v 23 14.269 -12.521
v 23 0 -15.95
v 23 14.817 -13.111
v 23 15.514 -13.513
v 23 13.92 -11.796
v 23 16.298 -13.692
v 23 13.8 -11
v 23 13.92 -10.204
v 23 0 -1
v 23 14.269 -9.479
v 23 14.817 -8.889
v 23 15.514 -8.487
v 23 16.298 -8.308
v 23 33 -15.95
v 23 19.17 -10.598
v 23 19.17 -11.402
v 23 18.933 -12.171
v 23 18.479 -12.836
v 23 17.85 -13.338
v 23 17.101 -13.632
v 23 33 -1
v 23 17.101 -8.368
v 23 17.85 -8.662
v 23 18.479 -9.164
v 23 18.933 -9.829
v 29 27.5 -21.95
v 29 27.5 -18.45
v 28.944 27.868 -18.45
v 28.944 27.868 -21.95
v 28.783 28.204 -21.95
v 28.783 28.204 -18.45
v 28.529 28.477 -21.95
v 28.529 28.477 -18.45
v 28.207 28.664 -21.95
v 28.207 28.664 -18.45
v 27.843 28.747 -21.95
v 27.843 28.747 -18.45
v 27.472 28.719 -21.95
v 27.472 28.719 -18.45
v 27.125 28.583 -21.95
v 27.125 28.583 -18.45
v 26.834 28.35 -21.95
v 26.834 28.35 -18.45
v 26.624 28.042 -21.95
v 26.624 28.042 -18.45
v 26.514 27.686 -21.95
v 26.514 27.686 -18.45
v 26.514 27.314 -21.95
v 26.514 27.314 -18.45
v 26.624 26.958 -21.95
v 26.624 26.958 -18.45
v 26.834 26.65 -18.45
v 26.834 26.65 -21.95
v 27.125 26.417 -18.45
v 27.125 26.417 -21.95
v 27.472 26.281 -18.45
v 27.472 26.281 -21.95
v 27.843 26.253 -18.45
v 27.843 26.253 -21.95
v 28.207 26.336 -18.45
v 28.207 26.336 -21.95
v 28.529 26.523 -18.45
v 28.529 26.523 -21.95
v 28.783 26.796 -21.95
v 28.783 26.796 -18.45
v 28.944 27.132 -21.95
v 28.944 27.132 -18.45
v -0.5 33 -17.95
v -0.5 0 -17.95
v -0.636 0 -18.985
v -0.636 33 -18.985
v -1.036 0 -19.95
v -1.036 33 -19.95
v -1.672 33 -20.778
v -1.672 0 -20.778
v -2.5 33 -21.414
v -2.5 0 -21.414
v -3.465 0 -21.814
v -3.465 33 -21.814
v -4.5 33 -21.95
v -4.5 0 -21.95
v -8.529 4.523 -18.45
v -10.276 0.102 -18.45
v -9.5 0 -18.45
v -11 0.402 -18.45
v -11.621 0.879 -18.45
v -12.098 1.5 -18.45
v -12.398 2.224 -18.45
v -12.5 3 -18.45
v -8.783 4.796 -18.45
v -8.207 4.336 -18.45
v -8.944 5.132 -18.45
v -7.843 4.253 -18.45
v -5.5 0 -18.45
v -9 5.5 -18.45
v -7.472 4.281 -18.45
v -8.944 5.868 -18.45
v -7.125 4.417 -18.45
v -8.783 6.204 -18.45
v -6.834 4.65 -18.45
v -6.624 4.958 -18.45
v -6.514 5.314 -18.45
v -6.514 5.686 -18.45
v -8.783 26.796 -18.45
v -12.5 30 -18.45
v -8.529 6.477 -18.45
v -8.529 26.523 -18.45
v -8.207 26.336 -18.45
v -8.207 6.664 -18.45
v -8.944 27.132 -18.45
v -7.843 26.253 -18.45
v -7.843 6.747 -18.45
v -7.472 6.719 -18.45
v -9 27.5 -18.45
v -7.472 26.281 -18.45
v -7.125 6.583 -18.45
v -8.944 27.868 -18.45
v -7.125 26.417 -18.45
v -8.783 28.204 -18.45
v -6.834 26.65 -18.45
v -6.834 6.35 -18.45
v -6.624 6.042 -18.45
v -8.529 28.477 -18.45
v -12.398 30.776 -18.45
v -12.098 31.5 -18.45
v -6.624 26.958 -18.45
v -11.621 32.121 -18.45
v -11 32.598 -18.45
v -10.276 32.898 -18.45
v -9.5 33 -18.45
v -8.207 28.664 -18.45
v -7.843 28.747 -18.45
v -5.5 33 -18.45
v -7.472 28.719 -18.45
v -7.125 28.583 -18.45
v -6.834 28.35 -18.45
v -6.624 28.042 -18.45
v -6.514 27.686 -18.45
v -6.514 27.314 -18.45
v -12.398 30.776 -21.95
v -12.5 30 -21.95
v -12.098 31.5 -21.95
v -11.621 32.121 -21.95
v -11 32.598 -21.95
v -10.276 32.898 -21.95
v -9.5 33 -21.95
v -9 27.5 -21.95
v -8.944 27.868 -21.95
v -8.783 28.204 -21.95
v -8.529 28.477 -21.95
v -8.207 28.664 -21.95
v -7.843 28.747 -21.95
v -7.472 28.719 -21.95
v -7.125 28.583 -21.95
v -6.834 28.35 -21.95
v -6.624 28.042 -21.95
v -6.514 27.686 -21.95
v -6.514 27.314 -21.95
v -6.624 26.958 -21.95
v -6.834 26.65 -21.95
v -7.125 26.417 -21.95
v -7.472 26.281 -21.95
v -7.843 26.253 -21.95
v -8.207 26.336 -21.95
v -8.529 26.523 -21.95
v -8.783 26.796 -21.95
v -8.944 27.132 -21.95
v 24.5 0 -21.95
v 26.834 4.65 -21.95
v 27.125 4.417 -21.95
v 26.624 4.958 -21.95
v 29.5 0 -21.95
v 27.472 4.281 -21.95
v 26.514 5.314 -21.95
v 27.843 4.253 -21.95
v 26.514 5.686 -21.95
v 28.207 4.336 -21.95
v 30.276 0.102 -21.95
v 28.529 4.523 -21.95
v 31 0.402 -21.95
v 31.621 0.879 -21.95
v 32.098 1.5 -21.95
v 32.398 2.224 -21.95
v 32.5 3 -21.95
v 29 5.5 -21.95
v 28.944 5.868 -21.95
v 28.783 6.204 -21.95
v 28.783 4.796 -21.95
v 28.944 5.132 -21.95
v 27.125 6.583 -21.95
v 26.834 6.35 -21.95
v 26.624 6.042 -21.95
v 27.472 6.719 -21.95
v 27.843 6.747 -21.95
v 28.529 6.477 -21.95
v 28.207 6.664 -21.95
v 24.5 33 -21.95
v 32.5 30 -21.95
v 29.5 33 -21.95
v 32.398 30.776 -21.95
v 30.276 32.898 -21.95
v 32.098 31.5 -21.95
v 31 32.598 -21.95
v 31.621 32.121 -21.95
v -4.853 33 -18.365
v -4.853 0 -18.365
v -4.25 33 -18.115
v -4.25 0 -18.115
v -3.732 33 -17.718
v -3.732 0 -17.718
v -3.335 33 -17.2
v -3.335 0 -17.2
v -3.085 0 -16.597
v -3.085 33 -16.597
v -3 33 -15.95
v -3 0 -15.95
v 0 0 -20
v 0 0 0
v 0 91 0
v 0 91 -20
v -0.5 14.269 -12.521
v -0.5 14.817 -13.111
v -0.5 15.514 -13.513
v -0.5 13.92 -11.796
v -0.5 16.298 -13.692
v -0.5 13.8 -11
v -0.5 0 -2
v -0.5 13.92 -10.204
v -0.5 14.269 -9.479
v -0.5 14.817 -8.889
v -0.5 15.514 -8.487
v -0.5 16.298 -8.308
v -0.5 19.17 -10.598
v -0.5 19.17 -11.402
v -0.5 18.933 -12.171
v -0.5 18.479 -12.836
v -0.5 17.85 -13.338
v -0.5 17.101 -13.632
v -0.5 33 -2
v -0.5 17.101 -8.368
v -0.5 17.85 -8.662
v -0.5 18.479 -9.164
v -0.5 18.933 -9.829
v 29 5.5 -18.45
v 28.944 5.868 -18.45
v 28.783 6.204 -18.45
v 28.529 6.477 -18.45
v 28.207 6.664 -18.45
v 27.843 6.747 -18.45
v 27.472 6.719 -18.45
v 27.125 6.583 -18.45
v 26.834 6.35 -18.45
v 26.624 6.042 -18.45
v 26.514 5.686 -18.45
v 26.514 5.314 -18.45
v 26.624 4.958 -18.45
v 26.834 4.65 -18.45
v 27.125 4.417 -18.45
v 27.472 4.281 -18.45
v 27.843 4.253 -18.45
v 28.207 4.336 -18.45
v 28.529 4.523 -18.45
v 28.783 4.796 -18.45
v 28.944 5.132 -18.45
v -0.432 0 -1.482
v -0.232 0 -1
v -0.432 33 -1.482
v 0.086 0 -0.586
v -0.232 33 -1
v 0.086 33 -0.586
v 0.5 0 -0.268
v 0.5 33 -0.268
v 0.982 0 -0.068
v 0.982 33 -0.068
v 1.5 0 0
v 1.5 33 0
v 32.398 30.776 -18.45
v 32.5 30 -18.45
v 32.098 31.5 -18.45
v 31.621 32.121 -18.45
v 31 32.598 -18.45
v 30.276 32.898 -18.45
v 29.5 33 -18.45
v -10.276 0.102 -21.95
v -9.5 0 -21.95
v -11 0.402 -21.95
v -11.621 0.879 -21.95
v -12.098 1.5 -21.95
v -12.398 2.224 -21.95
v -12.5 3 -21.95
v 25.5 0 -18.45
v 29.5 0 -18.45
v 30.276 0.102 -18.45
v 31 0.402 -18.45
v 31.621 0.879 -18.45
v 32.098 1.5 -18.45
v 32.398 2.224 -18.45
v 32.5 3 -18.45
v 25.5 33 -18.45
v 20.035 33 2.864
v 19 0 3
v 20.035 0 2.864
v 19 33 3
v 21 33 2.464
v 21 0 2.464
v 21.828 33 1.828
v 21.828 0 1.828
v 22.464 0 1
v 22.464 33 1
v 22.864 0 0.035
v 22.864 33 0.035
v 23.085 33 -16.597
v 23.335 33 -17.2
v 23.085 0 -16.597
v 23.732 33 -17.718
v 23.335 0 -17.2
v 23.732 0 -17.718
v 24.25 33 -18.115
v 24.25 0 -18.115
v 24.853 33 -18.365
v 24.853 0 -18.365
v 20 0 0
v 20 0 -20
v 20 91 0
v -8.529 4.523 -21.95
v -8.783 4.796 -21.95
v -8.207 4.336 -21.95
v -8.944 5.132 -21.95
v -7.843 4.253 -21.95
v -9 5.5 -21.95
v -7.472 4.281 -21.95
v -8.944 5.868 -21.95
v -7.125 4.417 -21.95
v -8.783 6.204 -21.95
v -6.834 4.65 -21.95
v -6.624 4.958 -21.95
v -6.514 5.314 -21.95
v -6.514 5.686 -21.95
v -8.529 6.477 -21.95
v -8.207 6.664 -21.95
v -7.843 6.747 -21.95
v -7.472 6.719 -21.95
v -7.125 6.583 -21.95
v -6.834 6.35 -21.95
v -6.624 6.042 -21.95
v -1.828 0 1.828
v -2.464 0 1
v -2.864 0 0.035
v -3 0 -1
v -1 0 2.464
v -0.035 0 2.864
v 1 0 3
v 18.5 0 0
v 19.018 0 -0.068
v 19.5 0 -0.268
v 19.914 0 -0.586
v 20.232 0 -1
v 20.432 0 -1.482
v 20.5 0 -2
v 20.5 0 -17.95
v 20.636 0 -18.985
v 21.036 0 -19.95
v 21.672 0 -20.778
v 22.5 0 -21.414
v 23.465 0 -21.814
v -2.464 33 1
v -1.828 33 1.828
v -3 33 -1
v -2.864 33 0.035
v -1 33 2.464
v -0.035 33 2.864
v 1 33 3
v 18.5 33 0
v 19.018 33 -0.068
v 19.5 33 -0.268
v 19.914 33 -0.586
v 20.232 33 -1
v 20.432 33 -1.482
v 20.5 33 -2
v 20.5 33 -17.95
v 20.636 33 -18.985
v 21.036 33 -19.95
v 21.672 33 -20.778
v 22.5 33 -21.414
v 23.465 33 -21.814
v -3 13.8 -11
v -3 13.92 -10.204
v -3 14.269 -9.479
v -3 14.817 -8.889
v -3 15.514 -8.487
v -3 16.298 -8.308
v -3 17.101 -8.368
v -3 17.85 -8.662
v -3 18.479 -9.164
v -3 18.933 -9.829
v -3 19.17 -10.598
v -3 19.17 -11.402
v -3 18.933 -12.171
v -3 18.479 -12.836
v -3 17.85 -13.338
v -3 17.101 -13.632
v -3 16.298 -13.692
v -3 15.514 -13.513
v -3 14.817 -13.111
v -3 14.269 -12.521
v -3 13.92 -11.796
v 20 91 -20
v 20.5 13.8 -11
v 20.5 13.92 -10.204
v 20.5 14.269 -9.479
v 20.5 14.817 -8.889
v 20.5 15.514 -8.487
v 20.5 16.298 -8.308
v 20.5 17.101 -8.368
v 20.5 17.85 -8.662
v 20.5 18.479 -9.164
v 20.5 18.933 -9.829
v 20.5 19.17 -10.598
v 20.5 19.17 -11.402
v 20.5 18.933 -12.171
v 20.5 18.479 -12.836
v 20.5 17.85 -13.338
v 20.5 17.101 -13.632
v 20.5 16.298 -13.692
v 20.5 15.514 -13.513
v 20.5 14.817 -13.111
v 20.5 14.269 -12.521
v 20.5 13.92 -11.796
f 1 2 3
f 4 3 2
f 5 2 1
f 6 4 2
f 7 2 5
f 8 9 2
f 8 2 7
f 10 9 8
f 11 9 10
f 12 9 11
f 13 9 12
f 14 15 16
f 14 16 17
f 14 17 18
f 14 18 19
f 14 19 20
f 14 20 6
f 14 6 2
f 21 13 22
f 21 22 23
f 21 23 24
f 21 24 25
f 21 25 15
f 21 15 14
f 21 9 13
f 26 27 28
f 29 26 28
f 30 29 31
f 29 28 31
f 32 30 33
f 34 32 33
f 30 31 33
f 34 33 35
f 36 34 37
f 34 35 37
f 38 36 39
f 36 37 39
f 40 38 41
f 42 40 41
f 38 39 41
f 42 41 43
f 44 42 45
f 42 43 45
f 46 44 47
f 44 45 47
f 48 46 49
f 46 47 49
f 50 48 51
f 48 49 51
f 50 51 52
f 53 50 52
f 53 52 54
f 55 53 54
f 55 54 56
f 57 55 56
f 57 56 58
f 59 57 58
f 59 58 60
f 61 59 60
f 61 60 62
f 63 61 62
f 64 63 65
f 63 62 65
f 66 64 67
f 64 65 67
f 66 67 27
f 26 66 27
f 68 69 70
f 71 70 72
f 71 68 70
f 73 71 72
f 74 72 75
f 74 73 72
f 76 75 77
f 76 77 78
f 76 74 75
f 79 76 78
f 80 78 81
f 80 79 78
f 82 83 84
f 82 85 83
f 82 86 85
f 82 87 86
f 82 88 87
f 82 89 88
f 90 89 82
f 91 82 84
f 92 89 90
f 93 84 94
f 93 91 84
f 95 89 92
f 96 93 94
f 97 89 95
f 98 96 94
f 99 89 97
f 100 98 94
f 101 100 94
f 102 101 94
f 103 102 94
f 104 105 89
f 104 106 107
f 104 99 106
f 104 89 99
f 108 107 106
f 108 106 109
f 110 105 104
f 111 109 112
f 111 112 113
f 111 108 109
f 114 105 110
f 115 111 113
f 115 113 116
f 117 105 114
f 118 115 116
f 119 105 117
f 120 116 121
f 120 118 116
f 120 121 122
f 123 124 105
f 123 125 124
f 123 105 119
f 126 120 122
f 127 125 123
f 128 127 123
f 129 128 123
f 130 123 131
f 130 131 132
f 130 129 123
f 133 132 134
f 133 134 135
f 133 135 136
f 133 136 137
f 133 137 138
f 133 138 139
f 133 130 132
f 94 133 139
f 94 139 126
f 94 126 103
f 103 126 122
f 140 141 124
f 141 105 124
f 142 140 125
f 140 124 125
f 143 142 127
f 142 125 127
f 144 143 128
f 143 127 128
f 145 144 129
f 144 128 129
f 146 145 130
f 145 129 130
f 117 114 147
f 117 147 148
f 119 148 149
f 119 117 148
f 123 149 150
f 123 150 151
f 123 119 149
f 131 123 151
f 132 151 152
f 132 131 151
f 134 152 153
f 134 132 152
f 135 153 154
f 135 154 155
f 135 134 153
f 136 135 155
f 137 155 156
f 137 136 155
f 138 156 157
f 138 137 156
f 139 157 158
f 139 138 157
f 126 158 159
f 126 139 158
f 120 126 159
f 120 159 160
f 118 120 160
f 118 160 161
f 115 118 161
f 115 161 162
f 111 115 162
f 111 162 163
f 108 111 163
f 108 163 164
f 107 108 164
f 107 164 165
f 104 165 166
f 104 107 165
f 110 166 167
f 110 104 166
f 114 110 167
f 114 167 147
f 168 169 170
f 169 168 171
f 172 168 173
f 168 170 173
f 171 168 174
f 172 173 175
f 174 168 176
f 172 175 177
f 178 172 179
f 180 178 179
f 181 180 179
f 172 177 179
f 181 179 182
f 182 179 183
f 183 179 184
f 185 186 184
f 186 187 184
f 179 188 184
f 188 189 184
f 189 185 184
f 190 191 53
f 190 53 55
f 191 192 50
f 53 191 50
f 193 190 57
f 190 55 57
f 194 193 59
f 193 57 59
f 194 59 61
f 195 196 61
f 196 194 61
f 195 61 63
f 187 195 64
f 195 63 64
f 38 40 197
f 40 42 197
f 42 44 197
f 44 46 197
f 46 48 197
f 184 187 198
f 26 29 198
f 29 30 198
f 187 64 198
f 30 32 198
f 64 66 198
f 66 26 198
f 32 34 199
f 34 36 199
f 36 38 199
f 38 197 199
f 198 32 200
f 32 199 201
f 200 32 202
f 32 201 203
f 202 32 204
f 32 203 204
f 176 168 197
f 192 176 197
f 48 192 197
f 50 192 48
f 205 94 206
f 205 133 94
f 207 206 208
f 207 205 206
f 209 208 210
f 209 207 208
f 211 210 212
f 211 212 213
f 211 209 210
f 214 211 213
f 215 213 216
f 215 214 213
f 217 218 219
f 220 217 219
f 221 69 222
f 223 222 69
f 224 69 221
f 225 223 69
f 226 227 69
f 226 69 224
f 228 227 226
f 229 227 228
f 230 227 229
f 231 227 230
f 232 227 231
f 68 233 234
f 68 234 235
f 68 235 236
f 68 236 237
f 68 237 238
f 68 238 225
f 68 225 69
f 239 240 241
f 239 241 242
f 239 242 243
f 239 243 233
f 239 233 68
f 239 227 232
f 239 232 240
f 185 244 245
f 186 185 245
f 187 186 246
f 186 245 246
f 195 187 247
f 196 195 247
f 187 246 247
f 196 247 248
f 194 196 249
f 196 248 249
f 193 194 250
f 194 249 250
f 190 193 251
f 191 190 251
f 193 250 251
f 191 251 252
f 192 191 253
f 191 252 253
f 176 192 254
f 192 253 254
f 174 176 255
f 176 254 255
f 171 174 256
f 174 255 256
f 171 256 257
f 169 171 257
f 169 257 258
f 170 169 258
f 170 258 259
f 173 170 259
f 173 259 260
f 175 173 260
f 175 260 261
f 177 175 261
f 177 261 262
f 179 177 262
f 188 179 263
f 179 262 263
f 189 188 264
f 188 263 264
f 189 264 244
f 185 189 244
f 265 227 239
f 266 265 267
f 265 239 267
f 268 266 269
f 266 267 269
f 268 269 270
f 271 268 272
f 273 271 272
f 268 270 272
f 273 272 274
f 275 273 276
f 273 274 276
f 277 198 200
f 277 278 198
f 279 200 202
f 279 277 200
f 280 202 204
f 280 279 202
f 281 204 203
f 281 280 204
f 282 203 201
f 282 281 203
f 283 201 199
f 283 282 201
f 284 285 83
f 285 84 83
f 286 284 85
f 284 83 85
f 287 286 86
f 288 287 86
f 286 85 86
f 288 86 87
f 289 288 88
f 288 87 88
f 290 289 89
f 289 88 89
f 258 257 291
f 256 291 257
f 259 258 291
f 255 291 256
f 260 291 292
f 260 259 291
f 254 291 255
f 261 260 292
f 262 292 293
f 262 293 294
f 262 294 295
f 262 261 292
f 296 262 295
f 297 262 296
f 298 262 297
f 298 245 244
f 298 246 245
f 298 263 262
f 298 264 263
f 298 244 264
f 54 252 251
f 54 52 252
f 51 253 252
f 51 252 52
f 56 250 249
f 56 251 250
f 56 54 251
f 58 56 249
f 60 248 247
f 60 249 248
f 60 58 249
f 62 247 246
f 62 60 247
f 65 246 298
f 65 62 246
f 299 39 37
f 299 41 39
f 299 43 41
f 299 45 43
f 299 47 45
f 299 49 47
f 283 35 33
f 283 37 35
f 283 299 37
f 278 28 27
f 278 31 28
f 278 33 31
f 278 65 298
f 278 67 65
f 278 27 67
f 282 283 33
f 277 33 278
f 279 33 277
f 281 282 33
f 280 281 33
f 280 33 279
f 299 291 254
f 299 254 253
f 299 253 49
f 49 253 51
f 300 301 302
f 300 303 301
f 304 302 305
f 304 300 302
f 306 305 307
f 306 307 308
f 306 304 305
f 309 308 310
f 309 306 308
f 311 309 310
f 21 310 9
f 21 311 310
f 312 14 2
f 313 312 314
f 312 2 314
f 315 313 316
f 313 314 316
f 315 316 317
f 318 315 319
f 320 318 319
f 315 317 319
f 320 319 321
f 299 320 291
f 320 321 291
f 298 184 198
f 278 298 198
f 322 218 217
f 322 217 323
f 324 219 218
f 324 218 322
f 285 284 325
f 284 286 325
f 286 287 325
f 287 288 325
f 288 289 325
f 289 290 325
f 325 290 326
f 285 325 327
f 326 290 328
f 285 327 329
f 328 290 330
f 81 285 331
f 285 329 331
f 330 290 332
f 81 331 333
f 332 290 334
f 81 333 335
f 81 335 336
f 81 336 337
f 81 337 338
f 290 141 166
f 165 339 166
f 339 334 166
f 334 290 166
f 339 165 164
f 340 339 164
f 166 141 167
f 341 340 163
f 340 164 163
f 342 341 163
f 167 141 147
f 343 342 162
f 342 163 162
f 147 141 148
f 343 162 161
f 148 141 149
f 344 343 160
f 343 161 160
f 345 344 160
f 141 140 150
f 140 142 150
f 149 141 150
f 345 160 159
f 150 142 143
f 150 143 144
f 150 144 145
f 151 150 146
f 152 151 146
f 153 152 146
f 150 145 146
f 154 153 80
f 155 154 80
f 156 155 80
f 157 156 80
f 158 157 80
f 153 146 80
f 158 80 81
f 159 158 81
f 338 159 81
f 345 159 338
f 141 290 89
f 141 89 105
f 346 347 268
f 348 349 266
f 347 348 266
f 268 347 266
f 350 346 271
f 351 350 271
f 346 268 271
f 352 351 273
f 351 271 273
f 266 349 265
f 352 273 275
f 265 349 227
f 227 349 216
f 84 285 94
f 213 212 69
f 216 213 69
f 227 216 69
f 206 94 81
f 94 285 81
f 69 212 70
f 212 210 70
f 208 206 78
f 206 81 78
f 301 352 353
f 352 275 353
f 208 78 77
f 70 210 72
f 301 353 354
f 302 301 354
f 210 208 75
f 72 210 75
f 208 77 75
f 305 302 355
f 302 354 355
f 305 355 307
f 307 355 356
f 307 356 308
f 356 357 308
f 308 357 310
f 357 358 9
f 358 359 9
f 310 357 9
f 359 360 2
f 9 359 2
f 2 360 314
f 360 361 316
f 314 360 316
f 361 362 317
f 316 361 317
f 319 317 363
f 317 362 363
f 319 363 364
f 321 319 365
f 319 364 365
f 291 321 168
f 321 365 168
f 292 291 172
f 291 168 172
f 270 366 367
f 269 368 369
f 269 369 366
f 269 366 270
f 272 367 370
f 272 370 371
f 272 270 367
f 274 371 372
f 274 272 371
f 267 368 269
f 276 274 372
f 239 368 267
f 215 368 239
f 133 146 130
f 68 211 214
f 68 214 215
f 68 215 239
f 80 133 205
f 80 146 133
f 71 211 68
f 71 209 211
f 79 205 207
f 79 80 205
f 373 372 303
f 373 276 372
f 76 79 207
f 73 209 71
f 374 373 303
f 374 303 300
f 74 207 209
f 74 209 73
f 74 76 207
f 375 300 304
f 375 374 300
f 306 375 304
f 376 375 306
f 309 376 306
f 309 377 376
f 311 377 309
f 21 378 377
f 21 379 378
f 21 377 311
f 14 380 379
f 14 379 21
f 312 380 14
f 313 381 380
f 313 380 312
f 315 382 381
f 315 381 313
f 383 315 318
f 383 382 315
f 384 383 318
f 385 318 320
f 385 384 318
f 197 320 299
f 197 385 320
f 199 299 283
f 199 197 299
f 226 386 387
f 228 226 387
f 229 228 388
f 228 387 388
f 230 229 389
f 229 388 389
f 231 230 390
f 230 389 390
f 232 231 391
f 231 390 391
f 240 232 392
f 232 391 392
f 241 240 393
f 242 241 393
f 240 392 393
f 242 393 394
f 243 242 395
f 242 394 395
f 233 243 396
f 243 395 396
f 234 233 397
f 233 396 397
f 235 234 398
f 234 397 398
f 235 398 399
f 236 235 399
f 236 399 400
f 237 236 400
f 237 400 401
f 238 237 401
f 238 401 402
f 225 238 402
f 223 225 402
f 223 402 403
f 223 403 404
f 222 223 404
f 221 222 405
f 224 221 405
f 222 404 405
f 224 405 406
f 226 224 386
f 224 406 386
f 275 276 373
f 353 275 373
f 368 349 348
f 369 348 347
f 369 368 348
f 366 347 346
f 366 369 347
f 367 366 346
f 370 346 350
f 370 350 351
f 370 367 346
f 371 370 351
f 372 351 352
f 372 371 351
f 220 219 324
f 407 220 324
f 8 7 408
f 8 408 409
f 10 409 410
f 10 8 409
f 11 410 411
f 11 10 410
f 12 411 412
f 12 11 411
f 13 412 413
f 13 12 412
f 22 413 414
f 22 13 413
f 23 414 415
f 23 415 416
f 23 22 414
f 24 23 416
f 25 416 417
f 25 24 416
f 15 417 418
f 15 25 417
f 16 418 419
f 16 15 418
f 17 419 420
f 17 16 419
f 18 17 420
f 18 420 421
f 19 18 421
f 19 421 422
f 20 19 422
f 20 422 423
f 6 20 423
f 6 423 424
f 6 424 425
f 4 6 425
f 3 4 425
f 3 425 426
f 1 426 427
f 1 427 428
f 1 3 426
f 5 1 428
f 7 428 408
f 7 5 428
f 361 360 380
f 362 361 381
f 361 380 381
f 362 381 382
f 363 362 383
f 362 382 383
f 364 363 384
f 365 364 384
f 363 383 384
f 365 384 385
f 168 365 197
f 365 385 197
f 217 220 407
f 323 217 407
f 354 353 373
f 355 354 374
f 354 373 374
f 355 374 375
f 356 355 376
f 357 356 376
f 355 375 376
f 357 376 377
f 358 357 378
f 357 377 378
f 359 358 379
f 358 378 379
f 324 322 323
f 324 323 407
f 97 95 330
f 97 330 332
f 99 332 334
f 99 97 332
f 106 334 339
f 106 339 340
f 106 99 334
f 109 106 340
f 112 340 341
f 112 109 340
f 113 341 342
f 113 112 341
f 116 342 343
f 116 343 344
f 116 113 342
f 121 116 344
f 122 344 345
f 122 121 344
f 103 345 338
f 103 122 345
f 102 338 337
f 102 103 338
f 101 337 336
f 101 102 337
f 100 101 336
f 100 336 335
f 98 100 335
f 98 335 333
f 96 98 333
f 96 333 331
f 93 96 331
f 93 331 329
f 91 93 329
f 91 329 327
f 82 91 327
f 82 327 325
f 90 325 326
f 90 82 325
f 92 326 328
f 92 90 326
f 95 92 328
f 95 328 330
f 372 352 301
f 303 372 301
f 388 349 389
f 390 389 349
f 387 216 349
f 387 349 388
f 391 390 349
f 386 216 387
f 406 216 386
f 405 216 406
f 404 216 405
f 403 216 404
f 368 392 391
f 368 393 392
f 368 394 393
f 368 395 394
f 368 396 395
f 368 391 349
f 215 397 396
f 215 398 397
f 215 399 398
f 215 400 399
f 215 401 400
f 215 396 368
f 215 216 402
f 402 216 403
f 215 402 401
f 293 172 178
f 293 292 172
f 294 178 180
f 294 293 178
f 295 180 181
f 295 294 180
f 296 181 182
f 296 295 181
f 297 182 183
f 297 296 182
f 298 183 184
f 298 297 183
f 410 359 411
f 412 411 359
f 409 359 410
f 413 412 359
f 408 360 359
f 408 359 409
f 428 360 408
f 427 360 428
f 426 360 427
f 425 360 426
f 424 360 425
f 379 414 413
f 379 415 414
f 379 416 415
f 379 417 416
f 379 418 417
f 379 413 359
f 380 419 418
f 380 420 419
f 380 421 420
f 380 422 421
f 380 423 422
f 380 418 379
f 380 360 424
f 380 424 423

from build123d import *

# Parameters (mm, degrees)
SKETCH1_W                = 20
SKETCH1_H                = 91
ROD_DEPTH                = 20
SKETCH2_W                = 26
SKETCH2_H                = 33
BOSS_EXTRUDE3_DEPTH      = 3
SKETCH4_W                = 2.5
SKETCH4_H                = 33
BOSS_EXTRUDE4_DEPTH      = 20.2
BOSS_EXTRUDE5_DEPTH      = 1.75
BOSS_EXTRUDE5_DEPTH_BACK = 1.75
SKETCH5_W                = 12
SKETCH5_H                = 33
SKETCH8_R                = 1.25
CUT_EXTRUDE1_DEPTH       = 3.5
FILLET1_R                = 2.5
FILLET2_R                = 4
FILLET3_R                = 2
FILLET4_R                = 4
SKETCH9_R                = 2.7
SIDE_EXTRUDE_DEPTH       = 2.5
FILLET5_R                = 3


with BuildPart() as part:
    # Sketch1 → rod (new body)
    with BuildSketch(Plane.XY):
        with Locations((10, 45.5)):
            Rectangle(SKETCH1_W, SKETCH1_H)
    extrude(amount=-ROD_DEPTH)


with BuildPart() as body_2:
    # Sketch2 → Boss-Extrude3 (new body)
    with BuildSketch(Plane.XY):
        with Locations((10, 16.5)):
            Rectangle(SKETCH2_W, SKETCH2_H)
    extrude(amount=BOSS_EXTRUDE3_DEPTH)

    # Sketch4 → Boss-Extrude4 (add)
    with BuildSketch(Plane.XY):
        with Locations((21.75, 16.5)):
            Rectangle(SKETCH4_W, SKETCH4_H)
        with Locations((-1.75, 16.5)):
            Rectangle(SKETCH4_W, SKETCH4_H)
    extrude(amount=-BOSS_EXTRUDE4_DEPTH)

    # Sketch5 → Boss-Extrude5 (add, two sides: drawn at the far end of the back side and taken through both)
    with BuildSketch(Plane.XY.offset(-20.2).offset(-BOSS_EXTRUDE5_DEPTH_BACK)):
        with Locations((26.5, 16.5)):
            Rectangle(SKETCH5_W, SKETCH5_H)
        with Locations((-6.5, 16.5)):
            Rectangle(SKETCH5_W, SKETCH5_H)
    extrude(amount=BOSS_EXTRUDE5_DEPTH + BOSS_EXTRUDE5_DEPTH_BACK)

    # Sketch8 → Cut-Extrude1 (cut)
    with BuildSketch(Plane.XY.offset(-18.45)):
        with Locations((27.75, 27.5)):
            Circle(SKETCH8_R)
        with Locations((27.75, 5.5)):
            Circle(SKETCH8_R)
    cut_extrude1 = extrude(amount=-CUT_EXTRUDE1_DEPTH, mode=Mode.SUBTRACT)

    # Mirror1: Cut-Extrude1 across plane
    add(cut_extrude1.mirror(Plane(origin=(10, 0, 0), x_dir=(0, 0, 1), z_dir=(1, 0, 0))), mode=Mode.SUBTRACT)

    # Fillet1
    fillet1_edges = [body_2.edges().sort_by_distance(p)[0] for p in [
        (23, 16.5, -18.45),
        (-3, 16.5, -18.45),
    ]]
    fillet(fillet1_edges, radius=FILLET1_R)

    # Fillet2
    fillet2_edges = [body_2.edges().sort_by_distance(p)[0] for p in [
        (-3, 16.5, 3),
        (23, 16.5, 3),
    ]]
    fillet(fillet2_edges, radius=FILLET2_R)

    # Fillet3
    fillet3_edges = [body_2.edges().sort_by_distance(p)[0] for p in [
        (20.5, 16.5, 0),
        (-0.5, 16.5, 0),
    ]]
    fillet(fillet3_edges, radius=FILLET3_R)

    # Fillet4
    fillet4_edges = [body_2.edges().sort_by_distance(p)[0] for p in [
        (20.5, 16.5, -21.95),
        (-0.5, 16.5, -21.95),
    ]]
    fillet(fillet4_edges, radius=FILLET4_R)

    # Sketch9 → Side Extrude (cut)
    with BuildSketch(Plane.ZY.offset(3)):
        with Locations(Location((-11, 16.5, 0), (0, 0, 270))):
            Circle(SKETCH9_R)
    side_extrude = extrude(amount=-SIDE_EXTRUDE_DEPTH, mode=Mode.SUBTRACT)

    # Mirror2: Side Extrude across plane
    add(side_extrude.mirror(Plane(origin=(10, 0, 0), x_dir=(0, 0, 1), z_dir=(1, 0, 0))), mode=Mode.SUBTRACT)

    # Fillet5
    fillet5_edges = [body_2.edges().sort_by_distance(p)[0] for p in [
        (32.5, 0, -20.2),
        (32.5, 33, -20.2),
        (-12.5, 0, -20.2),
        (-12.5, 33, -20.2),
    ]]
    fillet(fillet5_edges, radius=FILLET5_R)


solid = Compound([part.part, body_2.part])
